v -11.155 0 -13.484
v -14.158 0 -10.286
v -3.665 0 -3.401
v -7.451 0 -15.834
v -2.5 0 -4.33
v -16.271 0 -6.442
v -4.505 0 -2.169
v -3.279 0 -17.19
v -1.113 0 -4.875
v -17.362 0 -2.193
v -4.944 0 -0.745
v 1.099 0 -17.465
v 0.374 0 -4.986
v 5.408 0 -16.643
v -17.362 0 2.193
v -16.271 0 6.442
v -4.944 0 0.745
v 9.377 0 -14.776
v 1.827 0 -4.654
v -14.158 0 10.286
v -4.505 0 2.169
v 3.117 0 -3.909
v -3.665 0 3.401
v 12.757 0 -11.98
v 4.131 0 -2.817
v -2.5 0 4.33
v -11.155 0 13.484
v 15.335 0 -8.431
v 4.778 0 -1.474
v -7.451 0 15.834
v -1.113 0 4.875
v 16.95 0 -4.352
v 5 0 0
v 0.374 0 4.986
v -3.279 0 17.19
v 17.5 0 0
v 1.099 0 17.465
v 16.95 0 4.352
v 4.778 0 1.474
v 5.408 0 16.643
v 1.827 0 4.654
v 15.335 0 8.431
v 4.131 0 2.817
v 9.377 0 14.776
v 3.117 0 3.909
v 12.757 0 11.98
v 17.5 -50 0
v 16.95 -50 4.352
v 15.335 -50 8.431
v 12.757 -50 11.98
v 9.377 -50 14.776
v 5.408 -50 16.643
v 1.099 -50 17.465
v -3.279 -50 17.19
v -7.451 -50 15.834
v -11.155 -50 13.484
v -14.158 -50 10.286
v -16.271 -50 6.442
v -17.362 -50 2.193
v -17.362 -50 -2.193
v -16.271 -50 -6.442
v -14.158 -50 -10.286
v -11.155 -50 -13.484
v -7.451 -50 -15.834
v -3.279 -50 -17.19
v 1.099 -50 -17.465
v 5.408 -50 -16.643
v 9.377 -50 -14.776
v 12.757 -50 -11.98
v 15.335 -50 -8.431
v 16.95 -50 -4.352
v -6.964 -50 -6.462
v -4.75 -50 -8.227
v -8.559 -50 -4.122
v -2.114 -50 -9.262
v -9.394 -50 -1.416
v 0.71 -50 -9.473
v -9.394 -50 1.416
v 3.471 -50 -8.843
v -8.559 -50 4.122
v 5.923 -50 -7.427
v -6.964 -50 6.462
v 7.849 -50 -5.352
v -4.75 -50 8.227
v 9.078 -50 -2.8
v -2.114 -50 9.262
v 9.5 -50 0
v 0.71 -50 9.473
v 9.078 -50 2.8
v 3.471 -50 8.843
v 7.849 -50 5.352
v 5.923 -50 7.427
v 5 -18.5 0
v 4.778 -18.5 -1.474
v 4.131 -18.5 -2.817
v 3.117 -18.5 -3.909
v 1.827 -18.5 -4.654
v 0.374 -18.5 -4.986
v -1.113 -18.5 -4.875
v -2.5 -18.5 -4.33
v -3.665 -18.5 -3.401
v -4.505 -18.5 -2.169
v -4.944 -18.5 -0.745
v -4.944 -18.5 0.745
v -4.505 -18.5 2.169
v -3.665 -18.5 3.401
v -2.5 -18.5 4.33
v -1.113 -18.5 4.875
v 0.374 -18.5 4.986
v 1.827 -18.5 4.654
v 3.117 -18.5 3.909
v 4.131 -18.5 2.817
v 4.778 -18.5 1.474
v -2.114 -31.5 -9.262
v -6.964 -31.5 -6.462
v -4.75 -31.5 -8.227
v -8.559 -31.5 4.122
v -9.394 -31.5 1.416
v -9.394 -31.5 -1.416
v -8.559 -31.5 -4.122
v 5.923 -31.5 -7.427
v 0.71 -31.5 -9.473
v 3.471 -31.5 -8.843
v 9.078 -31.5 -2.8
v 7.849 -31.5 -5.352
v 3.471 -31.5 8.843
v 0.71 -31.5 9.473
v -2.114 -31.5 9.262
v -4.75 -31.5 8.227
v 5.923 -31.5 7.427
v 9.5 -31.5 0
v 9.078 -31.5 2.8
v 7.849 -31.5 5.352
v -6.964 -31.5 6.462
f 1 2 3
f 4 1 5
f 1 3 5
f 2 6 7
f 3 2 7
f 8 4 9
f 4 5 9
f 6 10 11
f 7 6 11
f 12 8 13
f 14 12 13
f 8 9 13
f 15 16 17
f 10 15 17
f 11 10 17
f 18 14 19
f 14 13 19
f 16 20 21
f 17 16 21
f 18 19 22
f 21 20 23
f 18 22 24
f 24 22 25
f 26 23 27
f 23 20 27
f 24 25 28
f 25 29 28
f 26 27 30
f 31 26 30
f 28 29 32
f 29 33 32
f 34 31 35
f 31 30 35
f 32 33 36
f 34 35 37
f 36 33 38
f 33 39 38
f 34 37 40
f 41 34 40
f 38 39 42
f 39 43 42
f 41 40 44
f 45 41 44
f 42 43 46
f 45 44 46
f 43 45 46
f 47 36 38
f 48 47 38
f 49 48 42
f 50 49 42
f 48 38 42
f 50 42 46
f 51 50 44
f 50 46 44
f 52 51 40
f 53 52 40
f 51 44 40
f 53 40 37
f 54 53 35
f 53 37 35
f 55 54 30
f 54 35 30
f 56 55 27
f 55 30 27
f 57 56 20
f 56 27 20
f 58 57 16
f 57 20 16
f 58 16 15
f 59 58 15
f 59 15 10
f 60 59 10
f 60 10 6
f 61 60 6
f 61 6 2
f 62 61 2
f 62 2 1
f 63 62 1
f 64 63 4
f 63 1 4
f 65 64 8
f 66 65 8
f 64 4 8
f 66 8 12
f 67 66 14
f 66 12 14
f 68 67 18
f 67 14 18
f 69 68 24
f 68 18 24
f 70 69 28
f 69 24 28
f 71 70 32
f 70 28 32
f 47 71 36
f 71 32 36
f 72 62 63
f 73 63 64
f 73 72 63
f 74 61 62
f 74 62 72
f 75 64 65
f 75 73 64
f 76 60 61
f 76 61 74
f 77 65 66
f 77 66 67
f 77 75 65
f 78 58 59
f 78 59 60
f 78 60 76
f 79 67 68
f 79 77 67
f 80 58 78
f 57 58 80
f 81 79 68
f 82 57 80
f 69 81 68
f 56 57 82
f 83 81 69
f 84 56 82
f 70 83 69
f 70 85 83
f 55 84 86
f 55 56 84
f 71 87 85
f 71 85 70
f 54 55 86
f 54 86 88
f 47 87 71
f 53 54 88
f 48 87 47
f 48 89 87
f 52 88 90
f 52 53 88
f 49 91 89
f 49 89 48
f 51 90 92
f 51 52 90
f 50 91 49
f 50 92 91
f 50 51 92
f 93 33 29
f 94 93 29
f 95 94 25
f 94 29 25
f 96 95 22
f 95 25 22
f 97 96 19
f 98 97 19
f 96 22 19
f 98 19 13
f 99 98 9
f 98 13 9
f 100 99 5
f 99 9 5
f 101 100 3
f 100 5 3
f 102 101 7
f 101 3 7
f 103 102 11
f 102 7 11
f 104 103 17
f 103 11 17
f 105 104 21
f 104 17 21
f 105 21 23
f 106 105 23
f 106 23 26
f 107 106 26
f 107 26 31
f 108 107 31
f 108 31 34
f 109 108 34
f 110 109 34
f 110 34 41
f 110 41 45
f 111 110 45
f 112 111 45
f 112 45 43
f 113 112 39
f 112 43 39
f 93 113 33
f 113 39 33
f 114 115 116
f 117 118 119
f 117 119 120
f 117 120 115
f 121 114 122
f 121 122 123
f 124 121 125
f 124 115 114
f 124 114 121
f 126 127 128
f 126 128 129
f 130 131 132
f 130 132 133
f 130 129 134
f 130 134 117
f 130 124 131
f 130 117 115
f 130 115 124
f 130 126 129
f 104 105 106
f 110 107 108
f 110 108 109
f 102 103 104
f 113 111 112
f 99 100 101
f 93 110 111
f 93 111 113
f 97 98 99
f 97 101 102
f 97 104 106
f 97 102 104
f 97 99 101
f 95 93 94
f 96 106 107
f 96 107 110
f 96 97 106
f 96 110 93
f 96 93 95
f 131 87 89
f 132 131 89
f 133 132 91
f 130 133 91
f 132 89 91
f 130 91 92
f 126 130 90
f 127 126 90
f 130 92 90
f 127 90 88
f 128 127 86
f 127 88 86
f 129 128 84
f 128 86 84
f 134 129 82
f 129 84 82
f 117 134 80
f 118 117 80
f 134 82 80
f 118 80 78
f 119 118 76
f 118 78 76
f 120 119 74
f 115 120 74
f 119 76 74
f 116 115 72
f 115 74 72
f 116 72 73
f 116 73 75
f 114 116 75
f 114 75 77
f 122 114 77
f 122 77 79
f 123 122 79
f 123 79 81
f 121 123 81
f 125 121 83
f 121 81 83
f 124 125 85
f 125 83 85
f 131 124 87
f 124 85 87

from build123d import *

# Parameters (mm, degrees)
SKETCH_R        = 17.5
PAD_DEPTH       = 50
SKETCH001_R     = 9.5
POCKET_DEPTH    = 18.5
SKETCH002_R     = 5
POCKET001_DEPTH = 18.5


with BuildPart() as part:
    # Sketch → Pad (new body)
    with BuildSketch(Plane.XZ):
        Circle(SKETCH_R)
    extrude(amount=PAD_DEPTH)

    # Sketch001 (on Face3 of Pad) → Pocket (cut)
    with BuildSketch(Plane.XZ.offset(50)):
        Circle(SKETCH001_R)
    extrude(amount=-POCKET_DEPTH, mode=Mode.SUBTRACT)

    # Sketch002 (on Face2 of Pocket) → Pocket001 (cut)
    with BuildSketch(Plane(origin=(0, 0, 0), x_dir=(1, 0, 0), z_dir=(0, 1, 0))):
        Circle(SKETCH002_R)
    extrude(amount=-POCKET001_DEPTH, mode=Mode.SUBTRACT)


solid = part.part
